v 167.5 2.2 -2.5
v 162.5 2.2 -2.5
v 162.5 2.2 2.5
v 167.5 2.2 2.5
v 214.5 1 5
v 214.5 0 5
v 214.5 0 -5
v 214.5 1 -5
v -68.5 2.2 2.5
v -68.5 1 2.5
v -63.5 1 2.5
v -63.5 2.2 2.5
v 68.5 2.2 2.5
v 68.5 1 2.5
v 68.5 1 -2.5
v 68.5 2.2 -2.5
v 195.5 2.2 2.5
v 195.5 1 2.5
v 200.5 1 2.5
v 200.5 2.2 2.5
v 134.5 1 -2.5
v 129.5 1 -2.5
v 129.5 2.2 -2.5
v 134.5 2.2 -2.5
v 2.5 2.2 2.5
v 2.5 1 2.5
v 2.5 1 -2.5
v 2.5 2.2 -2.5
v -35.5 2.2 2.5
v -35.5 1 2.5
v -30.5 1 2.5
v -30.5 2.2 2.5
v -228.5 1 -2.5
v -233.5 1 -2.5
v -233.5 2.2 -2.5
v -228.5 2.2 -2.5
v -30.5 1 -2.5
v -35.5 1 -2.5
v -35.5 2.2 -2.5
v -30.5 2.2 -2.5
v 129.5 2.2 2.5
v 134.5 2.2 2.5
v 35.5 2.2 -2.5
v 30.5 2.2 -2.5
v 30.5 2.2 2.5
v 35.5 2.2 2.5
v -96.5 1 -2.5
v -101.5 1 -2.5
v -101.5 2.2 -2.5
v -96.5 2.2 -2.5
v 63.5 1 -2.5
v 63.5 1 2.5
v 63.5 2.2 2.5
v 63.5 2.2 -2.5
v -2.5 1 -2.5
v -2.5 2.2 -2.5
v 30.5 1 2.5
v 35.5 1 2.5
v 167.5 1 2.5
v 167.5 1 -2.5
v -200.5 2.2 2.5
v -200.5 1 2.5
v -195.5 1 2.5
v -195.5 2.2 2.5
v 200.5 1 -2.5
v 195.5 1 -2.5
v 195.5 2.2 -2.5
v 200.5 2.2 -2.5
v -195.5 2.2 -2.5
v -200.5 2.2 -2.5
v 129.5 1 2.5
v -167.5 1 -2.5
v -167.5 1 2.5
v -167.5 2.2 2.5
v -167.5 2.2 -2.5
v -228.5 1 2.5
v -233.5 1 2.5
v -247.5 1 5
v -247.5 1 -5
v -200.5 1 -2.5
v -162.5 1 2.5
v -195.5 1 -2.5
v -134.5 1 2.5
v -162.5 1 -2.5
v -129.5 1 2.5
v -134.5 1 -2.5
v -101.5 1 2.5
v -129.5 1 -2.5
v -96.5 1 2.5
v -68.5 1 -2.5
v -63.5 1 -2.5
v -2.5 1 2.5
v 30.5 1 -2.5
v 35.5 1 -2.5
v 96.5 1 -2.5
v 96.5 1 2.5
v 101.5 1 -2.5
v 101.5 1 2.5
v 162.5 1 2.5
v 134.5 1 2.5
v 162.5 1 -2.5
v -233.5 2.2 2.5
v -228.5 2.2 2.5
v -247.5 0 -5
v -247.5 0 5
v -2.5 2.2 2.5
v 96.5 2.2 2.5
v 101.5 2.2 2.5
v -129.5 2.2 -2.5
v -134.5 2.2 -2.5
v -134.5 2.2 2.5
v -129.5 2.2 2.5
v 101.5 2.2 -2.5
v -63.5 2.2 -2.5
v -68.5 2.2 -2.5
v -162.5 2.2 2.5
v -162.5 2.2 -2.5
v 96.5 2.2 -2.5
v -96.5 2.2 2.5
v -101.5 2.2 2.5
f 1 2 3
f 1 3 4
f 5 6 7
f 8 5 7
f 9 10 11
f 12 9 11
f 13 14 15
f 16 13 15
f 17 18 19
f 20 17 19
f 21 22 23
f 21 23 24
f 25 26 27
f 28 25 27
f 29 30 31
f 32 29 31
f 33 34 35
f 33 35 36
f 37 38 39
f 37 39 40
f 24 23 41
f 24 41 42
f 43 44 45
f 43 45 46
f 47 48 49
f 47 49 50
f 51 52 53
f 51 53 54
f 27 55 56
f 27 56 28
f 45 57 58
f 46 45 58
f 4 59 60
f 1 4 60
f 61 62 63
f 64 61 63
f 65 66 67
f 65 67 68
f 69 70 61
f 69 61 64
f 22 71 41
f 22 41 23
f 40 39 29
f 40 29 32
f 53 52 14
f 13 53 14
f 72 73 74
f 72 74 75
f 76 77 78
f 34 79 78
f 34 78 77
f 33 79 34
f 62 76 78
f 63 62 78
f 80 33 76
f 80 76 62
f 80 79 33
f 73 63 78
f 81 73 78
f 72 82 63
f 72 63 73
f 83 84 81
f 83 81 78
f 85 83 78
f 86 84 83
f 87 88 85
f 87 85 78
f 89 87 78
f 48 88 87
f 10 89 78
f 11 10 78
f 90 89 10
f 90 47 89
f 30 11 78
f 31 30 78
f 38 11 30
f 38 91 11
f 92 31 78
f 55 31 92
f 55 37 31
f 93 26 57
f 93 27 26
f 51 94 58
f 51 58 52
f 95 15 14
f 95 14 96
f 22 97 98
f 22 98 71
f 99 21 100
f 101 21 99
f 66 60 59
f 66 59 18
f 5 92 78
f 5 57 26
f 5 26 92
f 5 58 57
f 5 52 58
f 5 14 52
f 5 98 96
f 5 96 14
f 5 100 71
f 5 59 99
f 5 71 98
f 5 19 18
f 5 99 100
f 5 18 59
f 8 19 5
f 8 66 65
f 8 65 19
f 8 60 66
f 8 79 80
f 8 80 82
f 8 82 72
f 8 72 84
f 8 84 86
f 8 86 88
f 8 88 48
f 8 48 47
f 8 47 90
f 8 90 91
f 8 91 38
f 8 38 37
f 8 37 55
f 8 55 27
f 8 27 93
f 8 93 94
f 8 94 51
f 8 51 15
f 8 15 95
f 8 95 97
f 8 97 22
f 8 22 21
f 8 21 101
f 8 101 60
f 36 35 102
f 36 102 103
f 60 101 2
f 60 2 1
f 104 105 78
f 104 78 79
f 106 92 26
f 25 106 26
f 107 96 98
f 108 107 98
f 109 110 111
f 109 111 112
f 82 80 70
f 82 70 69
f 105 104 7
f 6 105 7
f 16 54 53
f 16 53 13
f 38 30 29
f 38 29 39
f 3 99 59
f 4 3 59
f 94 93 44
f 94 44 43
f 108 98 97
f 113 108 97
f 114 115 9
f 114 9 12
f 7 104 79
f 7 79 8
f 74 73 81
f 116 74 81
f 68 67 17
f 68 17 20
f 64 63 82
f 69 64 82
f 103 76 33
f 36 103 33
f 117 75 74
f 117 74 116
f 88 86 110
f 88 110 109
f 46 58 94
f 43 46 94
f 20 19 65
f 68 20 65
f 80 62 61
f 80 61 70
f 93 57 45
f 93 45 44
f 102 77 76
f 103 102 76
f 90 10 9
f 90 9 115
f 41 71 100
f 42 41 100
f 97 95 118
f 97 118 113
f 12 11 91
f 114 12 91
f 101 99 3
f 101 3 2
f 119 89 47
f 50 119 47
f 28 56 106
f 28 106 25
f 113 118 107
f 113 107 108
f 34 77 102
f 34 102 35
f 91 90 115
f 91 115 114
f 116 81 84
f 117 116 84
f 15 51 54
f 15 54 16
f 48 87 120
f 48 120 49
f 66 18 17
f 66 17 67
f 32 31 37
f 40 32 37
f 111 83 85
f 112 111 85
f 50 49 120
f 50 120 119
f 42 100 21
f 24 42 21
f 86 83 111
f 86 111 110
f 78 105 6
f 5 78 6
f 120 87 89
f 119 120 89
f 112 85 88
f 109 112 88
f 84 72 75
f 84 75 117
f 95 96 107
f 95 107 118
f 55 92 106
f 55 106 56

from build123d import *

# Parameters (mm, degrees)
SKETCH1_W           = 33
SKETCH1_H           = 10
BOSS_EXTRUDE1_DEPTH = 1
SKETCH3_W           = 5
SKETCH3_H           = 5
BOSS_EXTRUDE2_DEPTH = 1.2
LPATTERN1_COUNT     = 8
LPATTERN1_PITCH     = 33
LPATTERN1_COL_COUNT = 7
LPATTERN1_COL_PITCH = 33


with BuildPart() as part:
    # Sketch1 → Boss-Extrude1 (new body)
    with BuildSketch(Plane(origin=(0, 0, 0), x_dir=(1, 0, 0), z_dir=(0, 1, 0))):
        Rectangle(SKETCH1_W, SKETCH1_H)
    boss_extrude1 = extrude(amount=BOSS_EXTRUDE1_DEPTH)

    # Sketch3 → Boss-Extrude2 (add)
    with BuildSketch(Plane(origin=(0, 1, 0), x_dir=(1, 0, 0), z_dir=(0, 1, 0))):
        Rectangle(SKETCH3_W, SKETCH3_H)
    boss_extrude2 = extrude(amount=BOSS_EXTRUDE2_DEPTH)

    # LPattern1: Boss-Extrude1, Boss-Extrude2 ×8
    with Locations(*[(-i * LPATTERN1_PITCH, 0, 0) for i in range(1, LPATTERN1_COUNT)]):
        add(boss_extrude1)
        add(boss_extrude2)

    # LPattern1 col: Boss-Extrude1, Boss-Extrude2 ×7
    with Locations(*[(i * LPATTERN1_COL_PITCH, 0, 0) for i in range(1, LPATTERN1_COL_COUNT)]):
        add(boss_extrude1)
        add(boss_extrude2)


solid = part.part
